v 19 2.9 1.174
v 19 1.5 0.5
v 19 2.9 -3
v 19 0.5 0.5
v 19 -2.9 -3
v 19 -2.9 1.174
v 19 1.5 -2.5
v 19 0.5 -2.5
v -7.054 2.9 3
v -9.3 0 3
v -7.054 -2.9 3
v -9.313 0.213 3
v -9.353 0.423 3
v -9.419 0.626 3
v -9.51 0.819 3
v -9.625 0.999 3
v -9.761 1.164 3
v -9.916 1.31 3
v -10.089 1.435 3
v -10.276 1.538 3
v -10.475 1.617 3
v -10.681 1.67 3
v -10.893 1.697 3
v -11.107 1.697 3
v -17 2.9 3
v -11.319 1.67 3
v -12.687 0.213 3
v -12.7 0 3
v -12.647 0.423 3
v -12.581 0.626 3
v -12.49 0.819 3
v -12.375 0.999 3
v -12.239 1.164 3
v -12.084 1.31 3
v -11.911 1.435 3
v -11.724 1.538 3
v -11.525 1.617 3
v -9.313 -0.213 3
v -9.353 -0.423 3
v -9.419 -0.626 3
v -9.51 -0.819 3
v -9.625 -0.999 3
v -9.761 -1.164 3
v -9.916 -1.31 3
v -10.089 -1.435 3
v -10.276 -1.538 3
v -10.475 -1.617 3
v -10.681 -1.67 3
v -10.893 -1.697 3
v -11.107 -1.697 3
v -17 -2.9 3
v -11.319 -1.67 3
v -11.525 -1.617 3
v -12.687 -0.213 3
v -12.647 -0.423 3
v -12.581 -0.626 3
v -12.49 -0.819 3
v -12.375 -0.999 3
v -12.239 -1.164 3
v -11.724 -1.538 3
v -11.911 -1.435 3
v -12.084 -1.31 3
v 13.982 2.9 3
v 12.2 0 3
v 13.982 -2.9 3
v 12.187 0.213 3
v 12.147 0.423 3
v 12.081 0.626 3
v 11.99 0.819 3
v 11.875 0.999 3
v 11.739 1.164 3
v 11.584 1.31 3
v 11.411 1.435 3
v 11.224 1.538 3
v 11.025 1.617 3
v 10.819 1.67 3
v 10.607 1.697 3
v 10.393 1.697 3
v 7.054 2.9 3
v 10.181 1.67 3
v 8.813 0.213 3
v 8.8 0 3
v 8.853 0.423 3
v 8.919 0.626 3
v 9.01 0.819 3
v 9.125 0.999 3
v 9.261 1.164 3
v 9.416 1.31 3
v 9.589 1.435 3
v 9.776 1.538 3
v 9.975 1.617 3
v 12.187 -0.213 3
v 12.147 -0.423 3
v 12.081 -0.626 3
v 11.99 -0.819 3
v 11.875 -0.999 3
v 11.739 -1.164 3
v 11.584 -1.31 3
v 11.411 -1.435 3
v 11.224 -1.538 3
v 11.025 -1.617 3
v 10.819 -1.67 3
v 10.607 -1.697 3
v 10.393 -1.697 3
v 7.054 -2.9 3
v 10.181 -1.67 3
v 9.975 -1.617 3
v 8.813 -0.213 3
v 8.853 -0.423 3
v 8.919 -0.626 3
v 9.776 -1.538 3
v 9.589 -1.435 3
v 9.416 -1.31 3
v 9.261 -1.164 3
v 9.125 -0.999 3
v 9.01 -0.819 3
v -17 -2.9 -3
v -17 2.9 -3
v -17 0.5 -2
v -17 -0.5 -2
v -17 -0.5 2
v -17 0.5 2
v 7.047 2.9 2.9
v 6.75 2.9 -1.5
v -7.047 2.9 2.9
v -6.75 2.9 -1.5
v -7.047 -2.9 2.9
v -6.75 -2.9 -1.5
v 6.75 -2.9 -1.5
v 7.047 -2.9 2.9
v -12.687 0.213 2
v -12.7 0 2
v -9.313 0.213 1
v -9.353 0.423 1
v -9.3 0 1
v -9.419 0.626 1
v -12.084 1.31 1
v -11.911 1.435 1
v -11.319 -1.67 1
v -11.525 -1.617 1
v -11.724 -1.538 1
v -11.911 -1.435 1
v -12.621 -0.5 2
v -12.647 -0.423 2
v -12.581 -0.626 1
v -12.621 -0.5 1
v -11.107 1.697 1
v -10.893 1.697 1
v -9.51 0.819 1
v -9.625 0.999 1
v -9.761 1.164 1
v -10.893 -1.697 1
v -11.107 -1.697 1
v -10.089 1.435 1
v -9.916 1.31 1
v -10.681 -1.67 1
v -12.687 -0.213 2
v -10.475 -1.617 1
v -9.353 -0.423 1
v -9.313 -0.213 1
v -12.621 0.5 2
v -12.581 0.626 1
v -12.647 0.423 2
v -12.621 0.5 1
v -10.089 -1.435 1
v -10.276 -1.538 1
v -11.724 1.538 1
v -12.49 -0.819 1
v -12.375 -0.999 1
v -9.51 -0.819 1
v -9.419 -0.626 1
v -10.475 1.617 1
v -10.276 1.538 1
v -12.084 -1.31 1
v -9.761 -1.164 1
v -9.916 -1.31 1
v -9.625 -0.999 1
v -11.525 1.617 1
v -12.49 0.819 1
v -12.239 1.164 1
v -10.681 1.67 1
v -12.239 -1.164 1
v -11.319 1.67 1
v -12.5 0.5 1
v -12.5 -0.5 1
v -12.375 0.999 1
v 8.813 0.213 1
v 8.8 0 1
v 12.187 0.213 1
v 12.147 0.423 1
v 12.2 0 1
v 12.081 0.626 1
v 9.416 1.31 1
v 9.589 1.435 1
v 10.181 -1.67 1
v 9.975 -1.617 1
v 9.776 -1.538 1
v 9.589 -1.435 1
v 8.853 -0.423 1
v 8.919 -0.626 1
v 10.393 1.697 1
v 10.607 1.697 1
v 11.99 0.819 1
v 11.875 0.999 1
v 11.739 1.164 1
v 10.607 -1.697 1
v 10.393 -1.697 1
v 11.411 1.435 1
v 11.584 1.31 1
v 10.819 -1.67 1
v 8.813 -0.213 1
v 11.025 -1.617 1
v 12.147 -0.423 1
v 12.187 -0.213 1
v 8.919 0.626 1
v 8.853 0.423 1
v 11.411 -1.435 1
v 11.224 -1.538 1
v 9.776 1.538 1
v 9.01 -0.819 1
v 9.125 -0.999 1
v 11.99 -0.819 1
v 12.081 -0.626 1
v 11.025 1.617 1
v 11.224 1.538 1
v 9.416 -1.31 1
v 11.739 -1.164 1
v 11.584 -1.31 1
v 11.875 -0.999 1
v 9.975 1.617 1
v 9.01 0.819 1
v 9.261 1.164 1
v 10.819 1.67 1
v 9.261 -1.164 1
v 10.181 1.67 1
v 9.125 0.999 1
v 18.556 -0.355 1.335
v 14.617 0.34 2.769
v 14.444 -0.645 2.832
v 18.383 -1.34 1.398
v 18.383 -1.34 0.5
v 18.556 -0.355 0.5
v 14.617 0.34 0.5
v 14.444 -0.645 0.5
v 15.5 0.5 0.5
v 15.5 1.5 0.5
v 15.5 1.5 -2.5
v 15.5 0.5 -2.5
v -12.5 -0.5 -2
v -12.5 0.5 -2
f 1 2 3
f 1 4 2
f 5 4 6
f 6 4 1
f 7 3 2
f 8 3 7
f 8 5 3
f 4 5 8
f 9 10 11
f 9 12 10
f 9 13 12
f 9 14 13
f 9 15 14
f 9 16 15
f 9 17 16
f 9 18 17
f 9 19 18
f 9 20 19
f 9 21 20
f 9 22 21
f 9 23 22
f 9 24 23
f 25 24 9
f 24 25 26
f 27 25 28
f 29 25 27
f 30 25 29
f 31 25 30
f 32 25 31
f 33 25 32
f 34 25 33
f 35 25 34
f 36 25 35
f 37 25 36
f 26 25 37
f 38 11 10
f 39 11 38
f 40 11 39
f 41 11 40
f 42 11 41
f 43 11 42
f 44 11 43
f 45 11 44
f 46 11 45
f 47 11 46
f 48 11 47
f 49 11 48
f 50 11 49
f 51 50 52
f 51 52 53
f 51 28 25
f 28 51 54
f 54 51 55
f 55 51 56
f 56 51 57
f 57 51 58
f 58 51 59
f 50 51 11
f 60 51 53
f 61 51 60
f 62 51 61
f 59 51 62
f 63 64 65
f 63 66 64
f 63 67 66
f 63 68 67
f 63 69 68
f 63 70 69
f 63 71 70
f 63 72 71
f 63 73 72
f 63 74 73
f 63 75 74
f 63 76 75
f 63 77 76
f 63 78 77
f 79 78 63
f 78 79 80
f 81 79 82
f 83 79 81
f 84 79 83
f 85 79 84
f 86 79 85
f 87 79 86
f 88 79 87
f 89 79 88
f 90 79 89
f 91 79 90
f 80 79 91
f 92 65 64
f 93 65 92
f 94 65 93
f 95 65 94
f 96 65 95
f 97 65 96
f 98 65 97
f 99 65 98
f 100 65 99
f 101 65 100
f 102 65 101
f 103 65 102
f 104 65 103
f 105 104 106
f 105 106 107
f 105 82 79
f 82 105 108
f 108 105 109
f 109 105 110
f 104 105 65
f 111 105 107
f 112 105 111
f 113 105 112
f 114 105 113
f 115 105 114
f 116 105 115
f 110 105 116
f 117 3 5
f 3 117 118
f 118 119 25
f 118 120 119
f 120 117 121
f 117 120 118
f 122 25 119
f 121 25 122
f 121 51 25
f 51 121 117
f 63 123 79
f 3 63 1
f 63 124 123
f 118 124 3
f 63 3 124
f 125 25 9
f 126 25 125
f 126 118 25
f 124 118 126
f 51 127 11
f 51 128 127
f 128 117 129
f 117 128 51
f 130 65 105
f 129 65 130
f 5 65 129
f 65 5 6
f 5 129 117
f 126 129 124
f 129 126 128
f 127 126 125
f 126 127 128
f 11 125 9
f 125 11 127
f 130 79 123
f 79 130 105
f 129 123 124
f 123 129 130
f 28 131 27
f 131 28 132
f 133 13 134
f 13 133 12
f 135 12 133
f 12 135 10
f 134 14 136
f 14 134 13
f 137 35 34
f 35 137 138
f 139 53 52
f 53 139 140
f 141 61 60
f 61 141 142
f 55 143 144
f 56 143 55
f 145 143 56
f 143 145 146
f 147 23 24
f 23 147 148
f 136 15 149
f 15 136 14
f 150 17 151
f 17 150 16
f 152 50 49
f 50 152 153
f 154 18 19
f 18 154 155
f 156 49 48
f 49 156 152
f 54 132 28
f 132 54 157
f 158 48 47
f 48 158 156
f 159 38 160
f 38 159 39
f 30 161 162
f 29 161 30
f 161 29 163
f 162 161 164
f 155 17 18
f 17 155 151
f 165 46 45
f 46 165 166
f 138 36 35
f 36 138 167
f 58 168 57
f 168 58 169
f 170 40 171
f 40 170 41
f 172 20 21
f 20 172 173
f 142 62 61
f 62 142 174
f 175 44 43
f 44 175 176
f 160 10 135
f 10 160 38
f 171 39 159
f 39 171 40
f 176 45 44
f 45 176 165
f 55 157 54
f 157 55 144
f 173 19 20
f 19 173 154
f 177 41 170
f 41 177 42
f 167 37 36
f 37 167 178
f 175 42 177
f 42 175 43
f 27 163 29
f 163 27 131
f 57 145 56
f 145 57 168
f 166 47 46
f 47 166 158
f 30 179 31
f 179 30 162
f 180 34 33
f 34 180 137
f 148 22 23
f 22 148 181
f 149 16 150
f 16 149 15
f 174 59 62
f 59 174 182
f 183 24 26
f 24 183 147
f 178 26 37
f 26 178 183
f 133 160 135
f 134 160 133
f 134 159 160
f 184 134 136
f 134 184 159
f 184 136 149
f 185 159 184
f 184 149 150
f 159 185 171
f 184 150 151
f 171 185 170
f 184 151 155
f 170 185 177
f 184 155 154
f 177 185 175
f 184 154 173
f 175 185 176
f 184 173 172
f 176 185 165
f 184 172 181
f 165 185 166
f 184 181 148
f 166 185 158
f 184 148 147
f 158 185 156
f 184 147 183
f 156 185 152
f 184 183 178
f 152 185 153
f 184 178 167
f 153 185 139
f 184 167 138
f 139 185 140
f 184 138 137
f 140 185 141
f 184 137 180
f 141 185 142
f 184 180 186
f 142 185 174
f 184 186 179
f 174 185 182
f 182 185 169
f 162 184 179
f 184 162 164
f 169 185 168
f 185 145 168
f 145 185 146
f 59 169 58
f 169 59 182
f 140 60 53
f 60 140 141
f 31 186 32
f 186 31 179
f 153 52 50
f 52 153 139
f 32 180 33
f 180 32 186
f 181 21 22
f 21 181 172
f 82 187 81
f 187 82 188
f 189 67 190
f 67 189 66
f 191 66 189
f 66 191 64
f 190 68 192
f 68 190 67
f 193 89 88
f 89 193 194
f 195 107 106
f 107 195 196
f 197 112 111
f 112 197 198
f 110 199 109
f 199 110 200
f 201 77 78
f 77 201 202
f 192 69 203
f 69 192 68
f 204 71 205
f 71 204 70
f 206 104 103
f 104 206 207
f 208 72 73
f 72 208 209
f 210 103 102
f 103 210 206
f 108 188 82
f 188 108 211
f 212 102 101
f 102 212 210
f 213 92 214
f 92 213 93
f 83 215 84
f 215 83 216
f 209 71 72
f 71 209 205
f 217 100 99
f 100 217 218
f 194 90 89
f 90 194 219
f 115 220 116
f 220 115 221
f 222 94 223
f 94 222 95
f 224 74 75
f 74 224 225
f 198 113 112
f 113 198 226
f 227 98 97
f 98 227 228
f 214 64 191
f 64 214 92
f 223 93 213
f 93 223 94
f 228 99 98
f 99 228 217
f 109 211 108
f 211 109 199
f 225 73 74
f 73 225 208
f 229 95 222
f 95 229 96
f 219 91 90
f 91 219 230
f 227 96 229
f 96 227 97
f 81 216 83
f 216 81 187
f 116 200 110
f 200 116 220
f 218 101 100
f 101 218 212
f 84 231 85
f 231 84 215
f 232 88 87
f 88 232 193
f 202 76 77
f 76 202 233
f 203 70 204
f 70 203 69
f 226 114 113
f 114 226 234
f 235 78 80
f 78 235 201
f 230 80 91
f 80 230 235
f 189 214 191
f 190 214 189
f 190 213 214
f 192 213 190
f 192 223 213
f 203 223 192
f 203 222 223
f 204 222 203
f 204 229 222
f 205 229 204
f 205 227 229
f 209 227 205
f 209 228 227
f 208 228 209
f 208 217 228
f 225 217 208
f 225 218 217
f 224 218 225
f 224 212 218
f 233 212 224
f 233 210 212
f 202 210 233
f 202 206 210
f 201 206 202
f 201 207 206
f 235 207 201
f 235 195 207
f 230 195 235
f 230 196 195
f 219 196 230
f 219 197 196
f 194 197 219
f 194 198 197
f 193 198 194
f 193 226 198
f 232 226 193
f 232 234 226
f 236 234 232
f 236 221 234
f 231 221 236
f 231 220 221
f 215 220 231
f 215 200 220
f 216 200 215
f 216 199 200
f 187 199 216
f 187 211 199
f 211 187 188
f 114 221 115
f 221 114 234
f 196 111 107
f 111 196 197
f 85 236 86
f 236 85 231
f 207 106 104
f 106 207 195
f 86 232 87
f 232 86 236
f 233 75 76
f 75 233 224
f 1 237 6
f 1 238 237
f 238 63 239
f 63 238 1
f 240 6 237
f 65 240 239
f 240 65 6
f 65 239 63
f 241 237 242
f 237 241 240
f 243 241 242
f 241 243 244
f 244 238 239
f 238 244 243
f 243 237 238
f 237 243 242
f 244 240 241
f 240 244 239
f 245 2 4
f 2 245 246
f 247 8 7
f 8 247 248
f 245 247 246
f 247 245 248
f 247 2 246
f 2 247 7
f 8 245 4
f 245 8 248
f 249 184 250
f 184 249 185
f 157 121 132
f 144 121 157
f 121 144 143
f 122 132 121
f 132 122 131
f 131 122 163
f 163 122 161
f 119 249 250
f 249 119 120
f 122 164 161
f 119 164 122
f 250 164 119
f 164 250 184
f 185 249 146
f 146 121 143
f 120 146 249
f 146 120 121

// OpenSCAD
$fn=50;

difference() {
  translate([1, 0, 0])
  cube([36, 5.8, 6], center=true);

  translate([0, 0, -1.5])
  linear_extrude(height=5, scale=[1.05, 1])
  square([13.5, 7], center=true);

  translate([-11, 0, 2.25])
  cylinder(h=2.5, d=3.4, center=true);

  translate([10.5, 0, 2.25])
  cylinder(h=2.5, d=3.4, center=true);

  translate([18, 0, 3.4])
  rotate([0, 20, 0])
  cube([10, 7, 3.5], center=true);

  translate([16.5, -0.5, 2.5])
  rotate([0, 0, -10])
  cube([4, 1, 4], center=true);

  translate([18, 1, -1])
  cube([5, 1, 3], center=true);

  translate([-15, 0, 0])
  cube([5, 1, 4], center=true);
}
